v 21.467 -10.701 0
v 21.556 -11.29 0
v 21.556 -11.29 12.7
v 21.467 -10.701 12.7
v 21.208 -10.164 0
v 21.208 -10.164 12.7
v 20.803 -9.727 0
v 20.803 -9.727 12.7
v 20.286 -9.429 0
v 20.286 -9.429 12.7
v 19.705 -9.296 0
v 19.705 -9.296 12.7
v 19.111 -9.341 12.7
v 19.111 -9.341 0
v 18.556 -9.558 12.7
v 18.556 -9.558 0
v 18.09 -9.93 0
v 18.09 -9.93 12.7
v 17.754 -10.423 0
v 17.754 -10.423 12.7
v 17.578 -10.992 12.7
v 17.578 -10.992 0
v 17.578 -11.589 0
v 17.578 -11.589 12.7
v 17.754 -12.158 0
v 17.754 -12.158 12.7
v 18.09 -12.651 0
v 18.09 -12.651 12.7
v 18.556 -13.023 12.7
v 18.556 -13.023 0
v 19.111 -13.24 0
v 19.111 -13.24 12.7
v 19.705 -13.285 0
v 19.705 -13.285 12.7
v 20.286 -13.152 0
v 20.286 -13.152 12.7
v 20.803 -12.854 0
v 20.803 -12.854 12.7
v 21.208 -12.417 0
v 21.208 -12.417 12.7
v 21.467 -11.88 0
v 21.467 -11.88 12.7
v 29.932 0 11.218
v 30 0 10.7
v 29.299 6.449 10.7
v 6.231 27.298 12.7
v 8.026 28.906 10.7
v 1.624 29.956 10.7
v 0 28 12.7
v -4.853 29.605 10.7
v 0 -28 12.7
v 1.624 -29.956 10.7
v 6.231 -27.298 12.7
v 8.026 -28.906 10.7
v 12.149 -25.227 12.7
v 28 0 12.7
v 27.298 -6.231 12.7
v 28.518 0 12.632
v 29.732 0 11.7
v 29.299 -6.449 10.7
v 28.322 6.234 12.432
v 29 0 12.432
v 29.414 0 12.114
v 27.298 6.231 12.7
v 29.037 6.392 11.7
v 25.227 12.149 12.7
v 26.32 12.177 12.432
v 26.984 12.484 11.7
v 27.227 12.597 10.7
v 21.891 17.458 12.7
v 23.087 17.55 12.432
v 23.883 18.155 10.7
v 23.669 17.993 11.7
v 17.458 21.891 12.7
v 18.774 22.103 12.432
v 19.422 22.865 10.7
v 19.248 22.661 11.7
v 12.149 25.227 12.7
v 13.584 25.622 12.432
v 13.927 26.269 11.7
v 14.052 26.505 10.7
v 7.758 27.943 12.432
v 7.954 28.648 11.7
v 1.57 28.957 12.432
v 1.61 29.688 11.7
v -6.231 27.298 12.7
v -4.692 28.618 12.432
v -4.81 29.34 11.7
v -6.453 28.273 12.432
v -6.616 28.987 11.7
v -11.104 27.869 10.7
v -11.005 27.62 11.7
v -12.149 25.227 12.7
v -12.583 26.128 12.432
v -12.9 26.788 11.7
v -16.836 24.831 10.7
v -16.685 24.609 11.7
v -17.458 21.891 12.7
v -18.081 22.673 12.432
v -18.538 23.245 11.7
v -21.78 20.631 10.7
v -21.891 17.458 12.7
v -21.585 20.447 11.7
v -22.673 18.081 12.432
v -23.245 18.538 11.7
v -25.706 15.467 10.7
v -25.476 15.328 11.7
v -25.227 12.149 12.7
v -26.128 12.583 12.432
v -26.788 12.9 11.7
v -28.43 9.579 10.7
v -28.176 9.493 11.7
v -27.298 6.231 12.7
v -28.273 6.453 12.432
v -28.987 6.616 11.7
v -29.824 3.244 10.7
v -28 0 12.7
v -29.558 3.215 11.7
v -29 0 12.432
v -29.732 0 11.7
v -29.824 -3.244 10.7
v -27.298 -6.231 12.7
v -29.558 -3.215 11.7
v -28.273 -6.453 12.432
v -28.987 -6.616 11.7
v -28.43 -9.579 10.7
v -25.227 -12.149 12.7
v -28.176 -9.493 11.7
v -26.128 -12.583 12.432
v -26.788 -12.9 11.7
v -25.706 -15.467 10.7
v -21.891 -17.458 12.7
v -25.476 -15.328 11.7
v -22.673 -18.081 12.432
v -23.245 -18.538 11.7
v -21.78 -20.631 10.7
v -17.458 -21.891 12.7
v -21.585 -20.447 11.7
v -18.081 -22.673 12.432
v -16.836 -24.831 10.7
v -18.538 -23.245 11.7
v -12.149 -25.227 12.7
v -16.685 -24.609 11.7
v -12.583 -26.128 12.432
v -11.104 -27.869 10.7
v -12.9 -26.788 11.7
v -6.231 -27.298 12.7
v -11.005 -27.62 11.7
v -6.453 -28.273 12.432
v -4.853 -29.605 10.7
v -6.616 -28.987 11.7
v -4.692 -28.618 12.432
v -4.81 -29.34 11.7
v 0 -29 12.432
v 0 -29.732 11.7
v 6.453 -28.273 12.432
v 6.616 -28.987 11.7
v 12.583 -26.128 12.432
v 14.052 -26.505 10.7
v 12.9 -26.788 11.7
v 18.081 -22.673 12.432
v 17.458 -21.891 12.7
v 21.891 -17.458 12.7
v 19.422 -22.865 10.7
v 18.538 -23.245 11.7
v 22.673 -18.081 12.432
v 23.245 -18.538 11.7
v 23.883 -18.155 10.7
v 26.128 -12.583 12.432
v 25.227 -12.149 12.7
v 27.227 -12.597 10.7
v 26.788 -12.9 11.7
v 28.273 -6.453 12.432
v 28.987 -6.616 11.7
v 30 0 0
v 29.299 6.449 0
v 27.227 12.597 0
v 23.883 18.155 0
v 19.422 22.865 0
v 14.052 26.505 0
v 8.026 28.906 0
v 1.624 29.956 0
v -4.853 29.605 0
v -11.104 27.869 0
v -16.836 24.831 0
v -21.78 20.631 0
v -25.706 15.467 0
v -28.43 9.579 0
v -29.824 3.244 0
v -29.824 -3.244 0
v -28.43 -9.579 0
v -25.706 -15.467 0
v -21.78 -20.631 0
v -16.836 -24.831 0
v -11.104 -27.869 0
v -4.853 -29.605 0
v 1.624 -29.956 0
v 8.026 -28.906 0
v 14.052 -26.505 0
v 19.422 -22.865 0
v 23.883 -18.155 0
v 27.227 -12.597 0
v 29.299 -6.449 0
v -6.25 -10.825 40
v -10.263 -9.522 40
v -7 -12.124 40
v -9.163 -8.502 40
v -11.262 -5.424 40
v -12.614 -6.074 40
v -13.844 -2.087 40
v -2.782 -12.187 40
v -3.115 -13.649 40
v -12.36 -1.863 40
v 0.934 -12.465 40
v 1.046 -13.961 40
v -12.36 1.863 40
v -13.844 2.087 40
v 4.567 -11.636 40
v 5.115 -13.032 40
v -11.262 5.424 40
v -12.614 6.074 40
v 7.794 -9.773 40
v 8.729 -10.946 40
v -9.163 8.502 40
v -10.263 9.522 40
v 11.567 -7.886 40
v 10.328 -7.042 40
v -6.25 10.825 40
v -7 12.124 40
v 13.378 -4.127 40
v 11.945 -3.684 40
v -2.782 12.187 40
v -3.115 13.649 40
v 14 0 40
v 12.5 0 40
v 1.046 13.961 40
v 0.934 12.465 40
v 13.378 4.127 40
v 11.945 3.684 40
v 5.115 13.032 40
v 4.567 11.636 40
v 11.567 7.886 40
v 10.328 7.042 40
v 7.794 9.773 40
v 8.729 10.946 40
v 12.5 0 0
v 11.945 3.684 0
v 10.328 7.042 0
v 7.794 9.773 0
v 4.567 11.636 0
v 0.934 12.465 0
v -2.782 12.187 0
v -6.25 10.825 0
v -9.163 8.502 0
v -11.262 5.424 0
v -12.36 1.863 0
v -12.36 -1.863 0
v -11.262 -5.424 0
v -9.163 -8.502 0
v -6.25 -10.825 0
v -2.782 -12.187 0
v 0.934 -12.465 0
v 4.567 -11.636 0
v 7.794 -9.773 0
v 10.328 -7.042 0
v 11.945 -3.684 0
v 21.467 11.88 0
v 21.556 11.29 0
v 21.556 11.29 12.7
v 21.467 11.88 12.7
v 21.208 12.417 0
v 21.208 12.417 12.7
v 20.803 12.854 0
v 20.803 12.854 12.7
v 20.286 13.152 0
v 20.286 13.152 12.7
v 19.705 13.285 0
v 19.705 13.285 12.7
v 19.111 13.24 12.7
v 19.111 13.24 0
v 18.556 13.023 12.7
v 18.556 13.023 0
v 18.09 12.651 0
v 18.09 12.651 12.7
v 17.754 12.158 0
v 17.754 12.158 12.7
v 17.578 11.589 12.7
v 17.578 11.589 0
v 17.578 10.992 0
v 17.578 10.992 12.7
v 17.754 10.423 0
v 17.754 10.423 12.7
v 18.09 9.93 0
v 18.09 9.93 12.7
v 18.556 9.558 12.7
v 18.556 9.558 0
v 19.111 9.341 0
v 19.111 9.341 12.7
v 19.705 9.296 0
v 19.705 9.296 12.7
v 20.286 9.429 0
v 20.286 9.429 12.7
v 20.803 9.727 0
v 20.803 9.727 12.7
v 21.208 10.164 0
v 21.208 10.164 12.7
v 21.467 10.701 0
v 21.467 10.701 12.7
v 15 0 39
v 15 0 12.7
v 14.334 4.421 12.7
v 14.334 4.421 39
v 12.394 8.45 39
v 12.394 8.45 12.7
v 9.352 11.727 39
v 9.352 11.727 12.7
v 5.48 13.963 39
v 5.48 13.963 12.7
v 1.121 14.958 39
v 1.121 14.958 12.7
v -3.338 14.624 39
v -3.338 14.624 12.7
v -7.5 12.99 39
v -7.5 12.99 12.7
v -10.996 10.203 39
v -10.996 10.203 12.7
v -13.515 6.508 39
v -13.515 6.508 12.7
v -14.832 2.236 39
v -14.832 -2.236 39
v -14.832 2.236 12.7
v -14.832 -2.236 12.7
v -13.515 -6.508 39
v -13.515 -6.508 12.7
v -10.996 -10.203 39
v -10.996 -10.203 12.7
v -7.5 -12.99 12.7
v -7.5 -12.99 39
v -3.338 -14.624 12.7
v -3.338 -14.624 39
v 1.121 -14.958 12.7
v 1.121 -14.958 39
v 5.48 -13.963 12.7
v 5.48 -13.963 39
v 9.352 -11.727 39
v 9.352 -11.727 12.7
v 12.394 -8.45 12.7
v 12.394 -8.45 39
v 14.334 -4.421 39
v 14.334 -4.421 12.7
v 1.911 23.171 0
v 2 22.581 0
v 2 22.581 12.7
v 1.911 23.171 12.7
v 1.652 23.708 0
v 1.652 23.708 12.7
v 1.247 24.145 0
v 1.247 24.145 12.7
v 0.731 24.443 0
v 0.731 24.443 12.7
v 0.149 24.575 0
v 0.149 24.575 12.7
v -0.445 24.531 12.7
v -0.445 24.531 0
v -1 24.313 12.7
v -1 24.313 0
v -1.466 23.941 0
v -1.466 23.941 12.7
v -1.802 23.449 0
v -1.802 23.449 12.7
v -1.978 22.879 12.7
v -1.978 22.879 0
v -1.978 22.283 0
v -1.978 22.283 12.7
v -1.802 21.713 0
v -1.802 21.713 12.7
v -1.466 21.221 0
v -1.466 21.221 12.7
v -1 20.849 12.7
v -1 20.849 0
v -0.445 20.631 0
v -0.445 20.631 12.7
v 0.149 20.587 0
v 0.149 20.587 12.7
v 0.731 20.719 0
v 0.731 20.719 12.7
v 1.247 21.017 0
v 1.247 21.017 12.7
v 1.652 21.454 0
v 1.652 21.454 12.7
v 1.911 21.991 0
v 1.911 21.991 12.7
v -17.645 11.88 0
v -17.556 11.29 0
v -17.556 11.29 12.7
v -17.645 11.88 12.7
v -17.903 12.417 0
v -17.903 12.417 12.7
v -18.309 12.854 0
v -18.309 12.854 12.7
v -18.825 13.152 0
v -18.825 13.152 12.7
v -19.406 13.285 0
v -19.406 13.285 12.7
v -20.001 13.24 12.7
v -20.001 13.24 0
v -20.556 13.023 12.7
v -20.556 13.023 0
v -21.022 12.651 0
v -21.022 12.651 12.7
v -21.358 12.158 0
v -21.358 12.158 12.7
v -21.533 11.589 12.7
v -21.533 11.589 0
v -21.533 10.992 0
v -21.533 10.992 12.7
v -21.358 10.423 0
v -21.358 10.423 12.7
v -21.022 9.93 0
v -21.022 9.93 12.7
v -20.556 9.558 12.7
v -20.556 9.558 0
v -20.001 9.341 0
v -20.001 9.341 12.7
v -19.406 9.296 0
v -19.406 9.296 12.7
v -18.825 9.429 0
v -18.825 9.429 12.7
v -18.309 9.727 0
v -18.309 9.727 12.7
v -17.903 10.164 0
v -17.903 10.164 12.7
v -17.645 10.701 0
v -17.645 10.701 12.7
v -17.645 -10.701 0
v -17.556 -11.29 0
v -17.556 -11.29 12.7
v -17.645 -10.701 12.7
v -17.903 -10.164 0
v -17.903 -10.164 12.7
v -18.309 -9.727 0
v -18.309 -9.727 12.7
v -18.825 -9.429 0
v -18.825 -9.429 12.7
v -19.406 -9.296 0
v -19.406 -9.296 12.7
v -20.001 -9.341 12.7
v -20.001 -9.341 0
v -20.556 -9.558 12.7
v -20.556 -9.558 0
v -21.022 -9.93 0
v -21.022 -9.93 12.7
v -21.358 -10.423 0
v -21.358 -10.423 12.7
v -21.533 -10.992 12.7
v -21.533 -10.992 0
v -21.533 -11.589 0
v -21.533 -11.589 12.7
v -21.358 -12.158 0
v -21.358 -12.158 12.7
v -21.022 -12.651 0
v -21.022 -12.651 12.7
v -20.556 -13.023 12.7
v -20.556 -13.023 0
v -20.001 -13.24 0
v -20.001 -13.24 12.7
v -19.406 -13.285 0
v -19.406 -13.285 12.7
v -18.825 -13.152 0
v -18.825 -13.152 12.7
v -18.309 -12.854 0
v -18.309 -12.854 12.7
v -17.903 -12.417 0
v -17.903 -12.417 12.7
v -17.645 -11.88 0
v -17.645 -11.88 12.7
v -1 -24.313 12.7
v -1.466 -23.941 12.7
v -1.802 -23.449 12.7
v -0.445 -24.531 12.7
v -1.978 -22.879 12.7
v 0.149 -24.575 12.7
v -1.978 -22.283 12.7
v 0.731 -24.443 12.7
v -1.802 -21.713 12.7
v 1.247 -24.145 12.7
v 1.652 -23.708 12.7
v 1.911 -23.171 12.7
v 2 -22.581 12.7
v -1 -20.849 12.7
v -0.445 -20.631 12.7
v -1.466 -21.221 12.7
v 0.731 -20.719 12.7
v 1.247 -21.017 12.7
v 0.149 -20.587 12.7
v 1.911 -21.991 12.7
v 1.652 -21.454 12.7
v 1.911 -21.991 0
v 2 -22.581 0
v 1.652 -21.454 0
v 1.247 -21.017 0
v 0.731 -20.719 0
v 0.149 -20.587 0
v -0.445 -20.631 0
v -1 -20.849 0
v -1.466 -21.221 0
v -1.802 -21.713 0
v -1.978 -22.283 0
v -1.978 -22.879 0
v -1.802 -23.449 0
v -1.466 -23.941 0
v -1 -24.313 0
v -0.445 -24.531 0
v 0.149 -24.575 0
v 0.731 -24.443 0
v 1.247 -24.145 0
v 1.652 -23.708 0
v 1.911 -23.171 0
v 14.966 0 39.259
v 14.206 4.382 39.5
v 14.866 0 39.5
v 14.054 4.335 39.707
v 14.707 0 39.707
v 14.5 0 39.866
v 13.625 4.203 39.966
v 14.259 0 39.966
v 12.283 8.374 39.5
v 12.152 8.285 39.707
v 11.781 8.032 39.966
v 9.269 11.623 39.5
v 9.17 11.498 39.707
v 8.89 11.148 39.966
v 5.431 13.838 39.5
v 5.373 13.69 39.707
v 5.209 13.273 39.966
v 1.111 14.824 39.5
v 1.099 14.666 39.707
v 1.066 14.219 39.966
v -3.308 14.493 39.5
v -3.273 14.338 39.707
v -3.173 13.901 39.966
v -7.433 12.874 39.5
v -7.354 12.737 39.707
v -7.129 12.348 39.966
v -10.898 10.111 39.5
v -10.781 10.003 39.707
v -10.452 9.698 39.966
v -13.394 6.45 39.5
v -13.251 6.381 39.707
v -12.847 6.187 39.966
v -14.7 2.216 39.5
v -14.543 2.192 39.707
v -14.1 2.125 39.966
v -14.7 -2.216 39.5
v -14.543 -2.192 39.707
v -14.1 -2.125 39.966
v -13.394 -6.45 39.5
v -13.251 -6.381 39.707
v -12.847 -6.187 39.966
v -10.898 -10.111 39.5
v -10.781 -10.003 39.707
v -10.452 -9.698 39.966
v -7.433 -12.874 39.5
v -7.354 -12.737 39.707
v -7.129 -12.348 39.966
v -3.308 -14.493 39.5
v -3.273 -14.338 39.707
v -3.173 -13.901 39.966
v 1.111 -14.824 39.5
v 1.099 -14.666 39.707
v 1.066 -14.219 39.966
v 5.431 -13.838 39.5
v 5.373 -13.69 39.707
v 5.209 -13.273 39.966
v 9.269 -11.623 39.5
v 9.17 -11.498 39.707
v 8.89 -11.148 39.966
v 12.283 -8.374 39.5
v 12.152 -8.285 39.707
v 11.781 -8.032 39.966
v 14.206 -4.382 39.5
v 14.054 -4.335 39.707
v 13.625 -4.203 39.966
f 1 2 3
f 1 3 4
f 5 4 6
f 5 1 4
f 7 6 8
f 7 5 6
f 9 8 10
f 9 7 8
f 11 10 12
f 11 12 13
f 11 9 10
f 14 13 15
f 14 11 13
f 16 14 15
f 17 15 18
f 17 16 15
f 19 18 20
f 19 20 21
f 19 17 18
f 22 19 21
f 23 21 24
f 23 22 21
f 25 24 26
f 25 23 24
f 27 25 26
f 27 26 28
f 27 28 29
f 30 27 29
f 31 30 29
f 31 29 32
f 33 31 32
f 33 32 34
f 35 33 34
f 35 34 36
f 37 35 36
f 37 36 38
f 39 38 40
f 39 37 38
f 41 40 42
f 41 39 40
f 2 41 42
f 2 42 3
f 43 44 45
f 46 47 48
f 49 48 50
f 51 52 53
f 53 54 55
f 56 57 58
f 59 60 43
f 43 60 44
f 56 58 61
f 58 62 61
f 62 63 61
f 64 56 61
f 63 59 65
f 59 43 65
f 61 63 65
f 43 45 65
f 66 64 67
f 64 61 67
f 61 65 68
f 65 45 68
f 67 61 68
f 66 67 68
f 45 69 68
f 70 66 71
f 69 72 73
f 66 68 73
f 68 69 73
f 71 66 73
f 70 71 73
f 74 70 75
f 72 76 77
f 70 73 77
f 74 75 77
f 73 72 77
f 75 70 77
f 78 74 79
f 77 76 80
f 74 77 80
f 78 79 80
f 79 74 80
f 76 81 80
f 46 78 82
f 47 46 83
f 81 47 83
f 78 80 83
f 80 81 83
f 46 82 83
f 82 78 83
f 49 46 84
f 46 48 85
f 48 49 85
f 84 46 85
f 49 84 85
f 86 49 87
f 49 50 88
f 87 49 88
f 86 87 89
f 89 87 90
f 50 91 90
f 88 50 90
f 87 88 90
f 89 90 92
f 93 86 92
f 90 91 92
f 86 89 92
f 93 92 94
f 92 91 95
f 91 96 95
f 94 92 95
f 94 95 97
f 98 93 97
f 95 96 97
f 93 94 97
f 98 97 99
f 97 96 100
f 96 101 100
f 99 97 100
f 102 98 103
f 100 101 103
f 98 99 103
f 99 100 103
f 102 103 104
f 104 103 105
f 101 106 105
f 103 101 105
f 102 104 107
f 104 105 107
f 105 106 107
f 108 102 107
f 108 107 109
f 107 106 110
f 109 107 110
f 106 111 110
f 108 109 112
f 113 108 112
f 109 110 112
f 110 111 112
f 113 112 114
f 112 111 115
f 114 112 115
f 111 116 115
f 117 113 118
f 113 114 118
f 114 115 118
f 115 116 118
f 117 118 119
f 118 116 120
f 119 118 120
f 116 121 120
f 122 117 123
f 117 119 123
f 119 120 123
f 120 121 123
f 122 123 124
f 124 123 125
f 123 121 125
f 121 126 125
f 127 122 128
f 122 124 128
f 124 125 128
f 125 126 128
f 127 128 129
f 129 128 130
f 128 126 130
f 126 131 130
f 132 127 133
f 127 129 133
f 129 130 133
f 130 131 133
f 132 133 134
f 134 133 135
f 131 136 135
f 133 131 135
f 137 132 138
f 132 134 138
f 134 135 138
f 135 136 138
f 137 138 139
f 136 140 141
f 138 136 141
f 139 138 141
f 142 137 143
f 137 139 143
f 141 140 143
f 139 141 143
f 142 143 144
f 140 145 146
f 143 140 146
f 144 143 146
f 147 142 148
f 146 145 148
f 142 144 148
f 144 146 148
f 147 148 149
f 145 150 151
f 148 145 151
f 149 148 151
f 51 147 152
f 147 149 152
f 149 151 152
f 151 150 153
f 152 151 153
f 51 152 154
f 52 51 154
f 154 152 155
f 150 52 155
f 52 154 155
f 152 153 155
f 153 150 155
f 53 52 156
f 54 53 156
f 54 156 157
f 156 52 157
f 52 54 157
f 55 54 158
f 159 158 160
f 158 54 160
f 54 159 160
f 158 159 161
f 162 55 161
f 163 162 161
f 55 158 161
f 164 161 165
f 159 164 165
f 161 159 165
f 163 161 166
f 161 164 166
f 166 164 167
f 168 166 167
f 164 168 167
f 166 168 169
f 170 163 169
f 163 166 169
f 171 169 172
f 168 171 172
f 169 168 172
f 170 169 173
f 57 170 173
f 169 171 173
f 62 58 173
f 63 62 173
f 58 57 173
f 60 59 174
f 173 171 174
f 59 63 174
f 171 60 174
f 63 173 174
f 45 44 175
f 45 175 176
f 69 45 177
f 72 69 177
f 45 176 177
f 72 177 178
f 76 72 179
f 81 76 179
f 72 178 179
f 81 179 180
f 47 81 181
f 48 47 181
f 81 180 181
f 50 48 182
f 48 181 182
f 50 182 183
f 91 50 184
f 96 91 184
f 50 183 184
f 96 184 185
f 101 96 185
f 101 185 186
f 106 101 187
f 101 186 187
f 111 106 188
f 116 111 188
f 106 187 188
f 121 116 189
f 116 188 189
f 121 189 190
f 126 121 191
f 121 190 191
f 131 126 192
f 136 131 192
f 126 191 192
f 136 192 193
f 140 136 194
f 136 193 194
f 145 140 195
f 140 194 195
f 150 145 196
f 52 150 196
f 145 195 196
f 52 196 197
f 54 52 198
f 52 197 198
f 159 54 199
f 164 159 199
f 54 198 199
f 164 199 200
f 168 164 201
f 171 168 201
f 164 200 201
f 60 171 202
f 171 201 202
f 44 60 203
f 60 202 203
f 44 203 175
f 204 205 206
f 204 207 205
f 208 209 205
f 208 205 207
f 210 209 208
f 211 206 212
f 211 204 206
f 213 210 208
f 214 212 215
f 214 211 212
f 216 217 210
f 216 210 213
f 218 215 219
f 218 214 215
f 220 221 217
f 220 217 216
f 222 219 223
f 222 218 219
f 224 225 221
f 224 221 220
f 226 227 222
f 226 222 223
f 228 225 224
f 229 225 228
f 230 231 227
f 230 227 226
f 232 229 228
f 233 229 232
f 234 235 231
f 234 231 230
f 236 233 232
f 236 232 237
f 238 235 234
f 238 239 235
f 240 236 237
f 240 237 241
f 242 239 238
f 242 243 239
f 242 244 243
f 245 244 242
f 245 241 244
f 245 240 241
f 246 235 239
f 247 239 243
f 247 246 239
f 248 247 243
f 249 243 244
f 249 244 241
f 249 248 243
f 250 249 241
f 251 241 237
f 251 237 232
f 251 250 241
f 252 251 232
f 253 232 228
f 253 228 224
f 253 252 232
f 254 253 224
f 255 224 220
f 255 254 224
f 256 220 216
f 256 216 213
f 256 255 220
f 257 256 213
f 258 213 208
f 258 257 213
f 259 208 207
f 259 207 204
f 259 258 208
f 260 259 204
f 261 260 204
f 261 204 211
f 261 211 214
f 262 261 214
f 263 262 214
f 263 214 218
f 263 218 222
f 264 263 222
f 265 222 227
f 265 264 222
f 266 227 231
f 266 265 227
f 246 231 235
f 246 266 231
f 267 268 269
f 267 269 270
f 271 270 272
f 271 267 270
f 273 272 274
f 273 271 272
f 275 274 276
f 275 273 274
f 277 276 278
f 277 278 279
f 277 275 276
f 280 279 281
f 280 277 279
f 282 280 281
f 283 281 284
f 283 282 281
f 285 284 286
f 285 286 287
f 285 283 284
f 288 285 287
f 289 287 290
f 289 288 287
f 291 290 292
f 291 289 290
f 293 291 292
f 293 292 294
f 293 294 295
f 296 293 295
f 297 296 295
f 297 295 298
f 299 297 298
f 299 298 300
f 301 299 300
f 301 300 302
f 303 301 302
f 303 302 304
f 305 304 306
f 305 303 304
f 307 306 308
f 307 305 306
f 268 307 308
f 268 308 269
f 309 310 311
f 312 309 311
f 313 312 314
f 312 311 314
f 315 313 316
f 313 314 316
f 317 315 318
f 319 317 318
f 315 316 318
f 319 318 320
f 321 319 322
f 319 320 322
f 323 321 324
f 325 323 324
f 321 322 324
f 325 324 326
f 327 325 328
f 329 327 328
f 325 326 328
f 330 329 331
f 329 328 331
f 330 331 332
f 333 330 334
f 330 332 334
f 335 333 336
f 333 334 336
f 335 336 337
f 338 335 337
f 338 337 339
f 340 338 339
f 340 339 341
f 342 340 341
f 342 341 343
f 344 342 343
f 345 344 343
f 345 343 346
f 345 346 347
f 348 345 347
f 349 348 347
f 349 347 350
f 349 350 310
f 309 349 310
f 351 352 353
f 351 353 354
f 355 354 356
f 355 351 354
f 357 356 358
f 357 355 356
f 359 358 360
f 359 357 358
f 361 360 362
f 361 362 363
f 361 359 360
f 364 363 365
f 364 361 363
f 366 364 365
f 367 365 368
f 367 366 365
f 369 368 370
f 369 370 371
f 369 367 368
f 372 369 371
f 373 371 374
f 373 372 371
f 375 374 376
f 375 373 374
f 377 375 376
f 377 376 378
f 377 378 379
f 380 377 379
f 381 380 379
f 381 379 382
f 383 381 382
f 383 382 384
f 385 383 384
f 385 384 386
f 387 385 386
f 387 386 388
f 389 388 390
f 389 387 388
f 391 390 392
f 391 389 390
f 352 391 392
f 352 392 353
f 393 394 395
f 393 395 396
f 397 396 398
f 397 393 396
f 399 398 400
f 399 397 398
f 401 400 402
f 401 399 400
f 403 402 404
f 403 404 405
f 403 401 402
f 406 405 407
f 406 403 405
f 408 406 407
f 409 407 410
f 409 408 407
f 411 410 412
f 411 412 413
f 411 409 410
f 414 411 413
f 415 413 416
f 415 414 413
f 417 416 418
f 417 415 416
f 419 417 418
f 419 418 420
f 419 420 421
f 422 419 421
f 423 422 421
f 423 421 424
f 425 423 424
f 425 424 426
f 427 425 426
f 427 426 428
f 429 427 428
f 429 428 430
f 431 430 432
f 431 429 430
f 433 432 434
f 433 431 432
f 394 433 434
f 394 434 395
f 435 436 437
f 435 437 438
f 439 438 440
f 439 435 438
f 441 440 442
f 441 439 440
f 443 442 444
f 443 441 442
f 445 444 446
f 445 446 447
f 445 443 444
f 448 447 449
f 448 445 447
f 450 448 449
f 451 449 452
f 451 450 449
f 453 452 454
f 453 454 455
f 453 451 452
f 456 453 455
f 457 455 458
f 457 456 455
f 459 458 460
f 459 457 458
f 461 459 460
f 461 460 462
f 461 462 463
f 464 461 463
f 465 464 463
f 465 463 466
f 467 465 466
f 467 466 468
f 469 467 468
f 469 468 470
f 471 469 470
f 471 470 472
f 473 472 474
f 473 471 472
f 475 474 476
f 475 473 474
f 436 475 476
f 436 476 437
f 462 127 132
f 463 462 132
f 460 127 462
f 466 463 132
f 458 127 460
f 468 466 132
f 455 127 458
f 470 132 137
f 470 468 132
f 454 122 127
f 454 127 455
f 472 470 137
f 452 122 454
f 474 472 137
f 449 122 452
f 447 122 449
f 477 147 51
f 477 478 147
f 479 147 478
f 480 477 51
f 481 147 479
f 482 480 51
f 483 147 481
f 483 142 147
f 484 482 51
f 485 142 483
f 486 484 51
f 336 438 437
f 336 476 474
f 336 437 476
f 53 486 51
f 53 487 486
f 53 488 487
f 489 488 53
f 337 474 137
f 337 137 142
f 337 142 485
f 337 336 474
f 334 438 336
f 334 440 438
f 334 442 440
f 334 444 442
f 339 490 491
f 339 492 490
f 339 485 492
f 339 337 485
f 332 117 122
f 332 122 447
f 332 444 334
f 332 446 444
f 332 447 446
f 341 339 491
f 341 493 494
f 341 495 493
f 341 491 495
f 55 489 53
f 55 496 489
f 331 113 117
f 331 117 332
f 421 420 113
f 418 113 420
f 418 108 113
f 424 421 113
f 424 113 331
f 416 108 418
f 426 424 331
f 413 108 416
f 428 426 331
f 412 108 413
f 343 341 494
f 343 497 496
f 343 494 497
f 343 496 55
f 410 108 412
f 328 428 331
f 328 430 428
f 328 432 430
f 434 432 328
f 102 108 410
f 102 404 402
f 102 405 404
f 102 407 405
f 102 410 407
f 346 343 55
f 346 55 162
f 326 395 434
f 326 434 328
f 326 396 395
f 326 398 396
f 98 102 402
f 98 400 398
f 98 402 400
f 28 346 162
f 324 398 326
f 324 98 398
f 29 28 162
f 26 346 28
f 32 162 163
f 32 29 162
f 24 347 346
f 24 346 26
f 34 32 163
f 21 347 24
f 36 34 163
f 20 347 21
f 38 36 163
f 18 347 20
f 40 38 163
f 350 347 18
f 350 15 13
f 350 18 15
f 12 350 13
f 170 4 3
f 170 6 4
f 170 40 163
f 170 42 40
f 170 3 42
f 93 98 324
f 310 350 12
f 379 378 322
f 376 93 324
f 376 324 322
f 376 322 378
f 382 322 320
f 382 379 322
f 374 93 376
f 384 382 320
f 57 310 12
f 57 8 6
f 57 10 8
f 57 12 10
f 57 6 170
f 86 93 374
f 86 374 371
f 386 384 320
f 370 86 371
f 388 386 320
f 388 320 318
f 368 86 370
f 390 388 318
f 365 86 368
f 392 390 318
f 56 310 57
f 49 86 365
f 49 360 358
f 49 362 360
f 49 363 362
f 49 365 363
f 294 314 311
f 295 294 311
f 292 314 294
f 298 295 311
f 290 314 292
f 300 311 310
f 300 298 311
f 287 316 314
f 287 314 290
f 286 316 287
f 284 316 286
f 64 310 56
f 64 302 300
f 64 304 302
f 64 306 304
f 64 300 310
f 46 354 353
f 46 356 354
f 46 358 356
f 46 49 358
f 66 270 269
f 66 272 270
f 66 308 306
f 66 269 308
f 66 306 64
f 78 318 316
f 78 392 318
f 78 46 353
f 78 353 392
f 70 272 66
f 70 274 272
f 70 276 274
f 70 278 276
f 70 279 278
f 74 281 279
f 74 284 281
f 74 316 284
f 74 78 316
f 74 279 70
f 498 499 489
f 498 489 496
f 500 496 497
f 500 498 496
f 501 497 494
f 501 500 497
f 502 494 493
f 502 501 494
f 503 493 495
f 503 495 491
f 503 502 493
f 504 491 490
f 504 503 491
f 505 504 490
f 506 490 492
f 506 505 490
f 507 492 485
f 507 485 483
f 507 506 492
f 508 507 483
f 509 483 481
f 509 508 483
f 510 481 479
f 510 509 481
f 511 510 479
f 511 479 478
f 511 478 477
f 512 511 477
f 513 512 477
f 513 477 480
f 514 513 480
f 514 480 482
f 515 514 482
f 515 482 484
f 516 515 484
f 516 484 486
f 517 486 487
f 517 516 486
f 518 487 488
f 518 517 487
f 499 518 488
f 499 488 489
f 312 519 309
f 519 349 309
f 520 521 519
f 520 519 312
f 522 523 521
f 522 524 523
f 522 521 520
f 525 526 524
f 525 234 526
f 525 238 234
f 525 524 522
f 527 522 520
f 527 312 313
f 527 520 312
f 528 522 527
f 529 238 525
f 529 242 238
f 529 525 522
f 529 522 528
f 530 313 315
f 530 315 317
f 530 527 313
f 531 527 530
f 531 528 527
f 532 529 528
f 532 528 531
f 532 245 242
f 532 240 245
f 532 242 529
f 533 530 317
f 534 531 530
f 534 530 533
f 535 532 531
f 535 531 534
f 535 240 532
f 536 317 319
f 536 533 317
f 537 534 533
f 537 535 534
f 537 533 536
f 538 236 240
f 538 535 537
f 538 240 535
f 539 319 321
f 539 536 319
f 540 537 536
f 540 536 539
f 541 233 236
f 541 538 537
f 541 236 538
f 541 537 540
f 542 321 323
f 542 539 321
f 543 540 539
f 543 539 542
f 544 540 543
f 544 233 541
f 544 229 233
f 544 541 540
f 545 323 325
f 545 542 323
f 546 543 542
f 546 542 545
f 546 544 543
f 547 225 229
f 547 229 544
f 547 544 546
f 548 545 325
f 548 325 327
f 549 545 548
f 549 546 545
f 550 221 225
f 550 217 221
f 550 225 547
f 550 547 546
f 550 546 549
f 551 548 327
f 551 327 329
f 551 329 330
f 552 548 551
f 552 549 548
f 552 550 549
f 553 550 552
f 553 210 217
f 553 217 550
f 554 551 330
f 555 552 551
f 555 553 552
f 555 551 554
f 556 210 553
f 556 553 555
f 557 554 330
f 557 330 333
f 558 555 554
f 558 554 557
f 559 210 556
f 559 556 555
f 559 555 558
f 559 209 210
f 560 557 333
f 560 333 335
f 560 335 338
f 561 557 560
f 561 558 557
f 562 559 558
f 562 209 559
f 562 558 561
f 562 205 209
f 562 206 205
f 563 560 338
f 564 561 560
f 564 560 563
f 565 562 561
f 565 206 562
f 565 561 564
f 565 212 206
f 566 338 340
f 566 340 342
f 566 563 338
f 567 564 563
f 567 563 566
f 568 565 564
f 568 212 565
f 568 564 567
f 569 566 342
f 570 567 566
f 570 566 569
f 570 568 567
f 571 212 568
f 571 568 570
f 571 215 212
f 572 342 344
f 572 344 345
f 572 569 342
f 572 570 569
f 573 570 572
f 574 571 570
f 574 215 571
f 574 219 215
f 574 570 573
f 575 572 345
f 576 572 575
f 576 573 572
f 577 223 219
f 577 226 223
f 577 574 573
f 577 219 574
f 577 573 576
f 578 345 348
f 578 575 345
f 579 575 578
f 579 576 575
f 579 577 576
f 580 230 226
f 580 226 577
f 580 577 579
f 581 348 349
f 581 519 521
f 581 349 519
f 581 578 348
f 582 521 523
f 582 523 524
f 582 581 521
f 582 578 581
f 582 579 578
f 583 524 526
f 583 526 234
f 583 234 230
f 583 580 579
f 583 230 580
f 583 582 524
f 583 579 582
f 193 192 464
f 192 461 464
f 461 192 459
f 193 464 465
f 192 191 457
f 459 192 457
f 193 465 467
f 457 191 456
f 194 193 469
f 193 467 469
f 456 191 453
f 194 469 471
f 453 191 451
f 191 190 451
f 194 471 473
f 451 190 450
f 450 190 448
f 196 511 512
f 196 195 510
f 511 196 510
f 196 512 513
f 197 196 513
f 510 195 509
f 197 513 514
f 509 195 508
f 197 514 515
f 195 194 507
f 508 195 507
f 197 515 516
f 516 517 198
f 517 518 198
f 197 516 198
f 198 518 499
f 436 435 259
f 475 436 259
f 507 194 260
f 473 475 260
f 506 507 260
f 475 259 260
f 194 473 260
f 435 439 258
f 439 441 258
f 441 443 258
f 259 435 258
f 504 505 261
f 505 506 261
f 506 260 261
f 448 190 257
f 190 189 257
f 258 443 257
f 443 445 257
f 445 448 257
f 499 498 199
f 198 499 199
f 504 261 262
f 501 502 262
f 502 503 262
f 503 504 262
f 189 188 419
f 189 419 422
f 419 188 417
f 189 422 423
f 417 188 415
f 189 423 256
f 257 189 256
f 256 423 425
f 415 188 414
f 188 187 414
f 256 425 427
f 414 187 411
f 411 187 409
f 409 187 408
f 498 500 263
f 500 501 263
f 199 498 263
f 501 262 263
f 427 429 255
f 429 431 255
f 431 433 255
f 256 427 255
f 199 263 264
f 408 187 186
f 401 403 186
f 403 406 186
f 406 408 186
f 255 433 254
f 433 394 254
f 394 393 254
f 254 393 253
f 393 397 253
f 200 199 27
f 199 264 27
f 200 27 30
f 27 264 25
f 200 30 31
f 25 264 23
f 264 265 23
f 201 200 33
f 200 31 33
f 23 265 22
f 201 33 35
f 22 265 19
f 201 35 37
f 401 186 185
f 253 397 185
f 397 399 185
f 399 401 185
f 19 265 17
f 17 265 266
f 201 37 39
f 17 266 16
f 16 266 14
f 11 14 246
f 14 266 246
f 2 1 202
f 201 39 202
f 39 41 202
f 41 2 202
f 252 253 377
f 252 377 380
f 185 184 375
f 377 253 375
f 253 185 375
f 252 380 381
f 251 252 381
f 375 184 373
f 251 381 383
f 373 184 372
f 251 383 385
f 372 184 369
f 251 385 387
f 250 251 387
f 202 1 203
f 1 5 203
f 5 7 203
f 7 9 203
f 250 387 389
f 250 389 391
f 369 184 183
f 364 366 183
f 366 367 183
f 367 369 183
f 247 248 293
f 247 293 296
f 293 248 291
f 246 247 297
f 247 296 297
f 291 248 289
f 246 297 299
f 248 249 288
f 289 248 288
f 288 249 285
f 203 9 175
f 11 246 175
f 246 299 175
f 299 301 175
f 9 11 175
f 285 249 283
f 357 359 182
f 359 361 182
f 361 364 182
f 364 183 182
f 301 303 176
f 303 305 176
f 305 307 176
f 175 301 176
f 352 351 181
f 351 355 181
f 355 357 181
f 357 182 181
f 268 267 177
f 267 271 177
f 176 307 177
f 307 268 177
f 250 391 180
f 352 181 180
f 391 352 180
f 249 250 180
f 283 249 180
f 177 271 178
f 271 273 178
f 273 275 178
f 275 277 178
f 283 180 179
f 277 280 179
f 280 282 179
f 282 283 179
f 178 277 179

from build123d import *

# Parameters (mm, degrees)
F0_R     = 15
F0_R_2   = 12.5
F0_R_3   = 30
F0_R_4   = 2
F1_DEPTH = 12.7
F2_DEPTH = 40
F3_R     = 1
F4_R     = 2


with BuildPart() as f1:
    # F0 (on Top) → F1 (new body)
    with BuildSketch(Plane.XY):
        Circle(F0_R)
        Circle(F0_R_2, mode=Mode.SUBTRACT)
        Circle(F0_R_3)
        with Locations((-19.55572, -11.2905)):
            Circle(F0_R_4, mode=Mode.SUBTRACT)
        with Locations((0, -22.581)):
            Circle(F0_R_4, mode=Mode.SUBTRACT)
        with Locations((19.55572, -11.2905)):
            Circle(F0_R_4, mode=Mode.SUBTRACT)
        with Locations((-19.55572, 11.2905)):
            Circle(F0_R_4, mode=Mode.SUBTRACT)
        Circle(F0_R, mode=Mode.SUBTRACT)
        with Locations((19.55572, 11.2905)):
            Circle(F0_R_4, mode=Mode.SUBTRACT)
        with Locations((0, 22.581)):
            Circle(F0_R_4, mode=Mode.SUBTRACT)
    extrude(amount=F1_DEPTH)

    # F0 (on Top) → F2 (join)
    with BuildSketch(Plane.XY):
        Circle(F0_R)
        Circle(F0_R_2, mode=Mode.SUBTRACT)
    extrude(amount=F2_DEPTH)

    # F3
    f3_edges = [f1.edges().sort_by_distance(p)[0] for p in [
        (-15, 0, 40),
    ]]
    fillet(f3_edges, radius=F3_R)

    # F4
    f4_edges = [f1.edges().sort_by_distance(p)[0] for p in [
        (-30, 0, 12.7),
    ]]
    fillet(f4_edges, radius=F4_R)


solid = f1.part
